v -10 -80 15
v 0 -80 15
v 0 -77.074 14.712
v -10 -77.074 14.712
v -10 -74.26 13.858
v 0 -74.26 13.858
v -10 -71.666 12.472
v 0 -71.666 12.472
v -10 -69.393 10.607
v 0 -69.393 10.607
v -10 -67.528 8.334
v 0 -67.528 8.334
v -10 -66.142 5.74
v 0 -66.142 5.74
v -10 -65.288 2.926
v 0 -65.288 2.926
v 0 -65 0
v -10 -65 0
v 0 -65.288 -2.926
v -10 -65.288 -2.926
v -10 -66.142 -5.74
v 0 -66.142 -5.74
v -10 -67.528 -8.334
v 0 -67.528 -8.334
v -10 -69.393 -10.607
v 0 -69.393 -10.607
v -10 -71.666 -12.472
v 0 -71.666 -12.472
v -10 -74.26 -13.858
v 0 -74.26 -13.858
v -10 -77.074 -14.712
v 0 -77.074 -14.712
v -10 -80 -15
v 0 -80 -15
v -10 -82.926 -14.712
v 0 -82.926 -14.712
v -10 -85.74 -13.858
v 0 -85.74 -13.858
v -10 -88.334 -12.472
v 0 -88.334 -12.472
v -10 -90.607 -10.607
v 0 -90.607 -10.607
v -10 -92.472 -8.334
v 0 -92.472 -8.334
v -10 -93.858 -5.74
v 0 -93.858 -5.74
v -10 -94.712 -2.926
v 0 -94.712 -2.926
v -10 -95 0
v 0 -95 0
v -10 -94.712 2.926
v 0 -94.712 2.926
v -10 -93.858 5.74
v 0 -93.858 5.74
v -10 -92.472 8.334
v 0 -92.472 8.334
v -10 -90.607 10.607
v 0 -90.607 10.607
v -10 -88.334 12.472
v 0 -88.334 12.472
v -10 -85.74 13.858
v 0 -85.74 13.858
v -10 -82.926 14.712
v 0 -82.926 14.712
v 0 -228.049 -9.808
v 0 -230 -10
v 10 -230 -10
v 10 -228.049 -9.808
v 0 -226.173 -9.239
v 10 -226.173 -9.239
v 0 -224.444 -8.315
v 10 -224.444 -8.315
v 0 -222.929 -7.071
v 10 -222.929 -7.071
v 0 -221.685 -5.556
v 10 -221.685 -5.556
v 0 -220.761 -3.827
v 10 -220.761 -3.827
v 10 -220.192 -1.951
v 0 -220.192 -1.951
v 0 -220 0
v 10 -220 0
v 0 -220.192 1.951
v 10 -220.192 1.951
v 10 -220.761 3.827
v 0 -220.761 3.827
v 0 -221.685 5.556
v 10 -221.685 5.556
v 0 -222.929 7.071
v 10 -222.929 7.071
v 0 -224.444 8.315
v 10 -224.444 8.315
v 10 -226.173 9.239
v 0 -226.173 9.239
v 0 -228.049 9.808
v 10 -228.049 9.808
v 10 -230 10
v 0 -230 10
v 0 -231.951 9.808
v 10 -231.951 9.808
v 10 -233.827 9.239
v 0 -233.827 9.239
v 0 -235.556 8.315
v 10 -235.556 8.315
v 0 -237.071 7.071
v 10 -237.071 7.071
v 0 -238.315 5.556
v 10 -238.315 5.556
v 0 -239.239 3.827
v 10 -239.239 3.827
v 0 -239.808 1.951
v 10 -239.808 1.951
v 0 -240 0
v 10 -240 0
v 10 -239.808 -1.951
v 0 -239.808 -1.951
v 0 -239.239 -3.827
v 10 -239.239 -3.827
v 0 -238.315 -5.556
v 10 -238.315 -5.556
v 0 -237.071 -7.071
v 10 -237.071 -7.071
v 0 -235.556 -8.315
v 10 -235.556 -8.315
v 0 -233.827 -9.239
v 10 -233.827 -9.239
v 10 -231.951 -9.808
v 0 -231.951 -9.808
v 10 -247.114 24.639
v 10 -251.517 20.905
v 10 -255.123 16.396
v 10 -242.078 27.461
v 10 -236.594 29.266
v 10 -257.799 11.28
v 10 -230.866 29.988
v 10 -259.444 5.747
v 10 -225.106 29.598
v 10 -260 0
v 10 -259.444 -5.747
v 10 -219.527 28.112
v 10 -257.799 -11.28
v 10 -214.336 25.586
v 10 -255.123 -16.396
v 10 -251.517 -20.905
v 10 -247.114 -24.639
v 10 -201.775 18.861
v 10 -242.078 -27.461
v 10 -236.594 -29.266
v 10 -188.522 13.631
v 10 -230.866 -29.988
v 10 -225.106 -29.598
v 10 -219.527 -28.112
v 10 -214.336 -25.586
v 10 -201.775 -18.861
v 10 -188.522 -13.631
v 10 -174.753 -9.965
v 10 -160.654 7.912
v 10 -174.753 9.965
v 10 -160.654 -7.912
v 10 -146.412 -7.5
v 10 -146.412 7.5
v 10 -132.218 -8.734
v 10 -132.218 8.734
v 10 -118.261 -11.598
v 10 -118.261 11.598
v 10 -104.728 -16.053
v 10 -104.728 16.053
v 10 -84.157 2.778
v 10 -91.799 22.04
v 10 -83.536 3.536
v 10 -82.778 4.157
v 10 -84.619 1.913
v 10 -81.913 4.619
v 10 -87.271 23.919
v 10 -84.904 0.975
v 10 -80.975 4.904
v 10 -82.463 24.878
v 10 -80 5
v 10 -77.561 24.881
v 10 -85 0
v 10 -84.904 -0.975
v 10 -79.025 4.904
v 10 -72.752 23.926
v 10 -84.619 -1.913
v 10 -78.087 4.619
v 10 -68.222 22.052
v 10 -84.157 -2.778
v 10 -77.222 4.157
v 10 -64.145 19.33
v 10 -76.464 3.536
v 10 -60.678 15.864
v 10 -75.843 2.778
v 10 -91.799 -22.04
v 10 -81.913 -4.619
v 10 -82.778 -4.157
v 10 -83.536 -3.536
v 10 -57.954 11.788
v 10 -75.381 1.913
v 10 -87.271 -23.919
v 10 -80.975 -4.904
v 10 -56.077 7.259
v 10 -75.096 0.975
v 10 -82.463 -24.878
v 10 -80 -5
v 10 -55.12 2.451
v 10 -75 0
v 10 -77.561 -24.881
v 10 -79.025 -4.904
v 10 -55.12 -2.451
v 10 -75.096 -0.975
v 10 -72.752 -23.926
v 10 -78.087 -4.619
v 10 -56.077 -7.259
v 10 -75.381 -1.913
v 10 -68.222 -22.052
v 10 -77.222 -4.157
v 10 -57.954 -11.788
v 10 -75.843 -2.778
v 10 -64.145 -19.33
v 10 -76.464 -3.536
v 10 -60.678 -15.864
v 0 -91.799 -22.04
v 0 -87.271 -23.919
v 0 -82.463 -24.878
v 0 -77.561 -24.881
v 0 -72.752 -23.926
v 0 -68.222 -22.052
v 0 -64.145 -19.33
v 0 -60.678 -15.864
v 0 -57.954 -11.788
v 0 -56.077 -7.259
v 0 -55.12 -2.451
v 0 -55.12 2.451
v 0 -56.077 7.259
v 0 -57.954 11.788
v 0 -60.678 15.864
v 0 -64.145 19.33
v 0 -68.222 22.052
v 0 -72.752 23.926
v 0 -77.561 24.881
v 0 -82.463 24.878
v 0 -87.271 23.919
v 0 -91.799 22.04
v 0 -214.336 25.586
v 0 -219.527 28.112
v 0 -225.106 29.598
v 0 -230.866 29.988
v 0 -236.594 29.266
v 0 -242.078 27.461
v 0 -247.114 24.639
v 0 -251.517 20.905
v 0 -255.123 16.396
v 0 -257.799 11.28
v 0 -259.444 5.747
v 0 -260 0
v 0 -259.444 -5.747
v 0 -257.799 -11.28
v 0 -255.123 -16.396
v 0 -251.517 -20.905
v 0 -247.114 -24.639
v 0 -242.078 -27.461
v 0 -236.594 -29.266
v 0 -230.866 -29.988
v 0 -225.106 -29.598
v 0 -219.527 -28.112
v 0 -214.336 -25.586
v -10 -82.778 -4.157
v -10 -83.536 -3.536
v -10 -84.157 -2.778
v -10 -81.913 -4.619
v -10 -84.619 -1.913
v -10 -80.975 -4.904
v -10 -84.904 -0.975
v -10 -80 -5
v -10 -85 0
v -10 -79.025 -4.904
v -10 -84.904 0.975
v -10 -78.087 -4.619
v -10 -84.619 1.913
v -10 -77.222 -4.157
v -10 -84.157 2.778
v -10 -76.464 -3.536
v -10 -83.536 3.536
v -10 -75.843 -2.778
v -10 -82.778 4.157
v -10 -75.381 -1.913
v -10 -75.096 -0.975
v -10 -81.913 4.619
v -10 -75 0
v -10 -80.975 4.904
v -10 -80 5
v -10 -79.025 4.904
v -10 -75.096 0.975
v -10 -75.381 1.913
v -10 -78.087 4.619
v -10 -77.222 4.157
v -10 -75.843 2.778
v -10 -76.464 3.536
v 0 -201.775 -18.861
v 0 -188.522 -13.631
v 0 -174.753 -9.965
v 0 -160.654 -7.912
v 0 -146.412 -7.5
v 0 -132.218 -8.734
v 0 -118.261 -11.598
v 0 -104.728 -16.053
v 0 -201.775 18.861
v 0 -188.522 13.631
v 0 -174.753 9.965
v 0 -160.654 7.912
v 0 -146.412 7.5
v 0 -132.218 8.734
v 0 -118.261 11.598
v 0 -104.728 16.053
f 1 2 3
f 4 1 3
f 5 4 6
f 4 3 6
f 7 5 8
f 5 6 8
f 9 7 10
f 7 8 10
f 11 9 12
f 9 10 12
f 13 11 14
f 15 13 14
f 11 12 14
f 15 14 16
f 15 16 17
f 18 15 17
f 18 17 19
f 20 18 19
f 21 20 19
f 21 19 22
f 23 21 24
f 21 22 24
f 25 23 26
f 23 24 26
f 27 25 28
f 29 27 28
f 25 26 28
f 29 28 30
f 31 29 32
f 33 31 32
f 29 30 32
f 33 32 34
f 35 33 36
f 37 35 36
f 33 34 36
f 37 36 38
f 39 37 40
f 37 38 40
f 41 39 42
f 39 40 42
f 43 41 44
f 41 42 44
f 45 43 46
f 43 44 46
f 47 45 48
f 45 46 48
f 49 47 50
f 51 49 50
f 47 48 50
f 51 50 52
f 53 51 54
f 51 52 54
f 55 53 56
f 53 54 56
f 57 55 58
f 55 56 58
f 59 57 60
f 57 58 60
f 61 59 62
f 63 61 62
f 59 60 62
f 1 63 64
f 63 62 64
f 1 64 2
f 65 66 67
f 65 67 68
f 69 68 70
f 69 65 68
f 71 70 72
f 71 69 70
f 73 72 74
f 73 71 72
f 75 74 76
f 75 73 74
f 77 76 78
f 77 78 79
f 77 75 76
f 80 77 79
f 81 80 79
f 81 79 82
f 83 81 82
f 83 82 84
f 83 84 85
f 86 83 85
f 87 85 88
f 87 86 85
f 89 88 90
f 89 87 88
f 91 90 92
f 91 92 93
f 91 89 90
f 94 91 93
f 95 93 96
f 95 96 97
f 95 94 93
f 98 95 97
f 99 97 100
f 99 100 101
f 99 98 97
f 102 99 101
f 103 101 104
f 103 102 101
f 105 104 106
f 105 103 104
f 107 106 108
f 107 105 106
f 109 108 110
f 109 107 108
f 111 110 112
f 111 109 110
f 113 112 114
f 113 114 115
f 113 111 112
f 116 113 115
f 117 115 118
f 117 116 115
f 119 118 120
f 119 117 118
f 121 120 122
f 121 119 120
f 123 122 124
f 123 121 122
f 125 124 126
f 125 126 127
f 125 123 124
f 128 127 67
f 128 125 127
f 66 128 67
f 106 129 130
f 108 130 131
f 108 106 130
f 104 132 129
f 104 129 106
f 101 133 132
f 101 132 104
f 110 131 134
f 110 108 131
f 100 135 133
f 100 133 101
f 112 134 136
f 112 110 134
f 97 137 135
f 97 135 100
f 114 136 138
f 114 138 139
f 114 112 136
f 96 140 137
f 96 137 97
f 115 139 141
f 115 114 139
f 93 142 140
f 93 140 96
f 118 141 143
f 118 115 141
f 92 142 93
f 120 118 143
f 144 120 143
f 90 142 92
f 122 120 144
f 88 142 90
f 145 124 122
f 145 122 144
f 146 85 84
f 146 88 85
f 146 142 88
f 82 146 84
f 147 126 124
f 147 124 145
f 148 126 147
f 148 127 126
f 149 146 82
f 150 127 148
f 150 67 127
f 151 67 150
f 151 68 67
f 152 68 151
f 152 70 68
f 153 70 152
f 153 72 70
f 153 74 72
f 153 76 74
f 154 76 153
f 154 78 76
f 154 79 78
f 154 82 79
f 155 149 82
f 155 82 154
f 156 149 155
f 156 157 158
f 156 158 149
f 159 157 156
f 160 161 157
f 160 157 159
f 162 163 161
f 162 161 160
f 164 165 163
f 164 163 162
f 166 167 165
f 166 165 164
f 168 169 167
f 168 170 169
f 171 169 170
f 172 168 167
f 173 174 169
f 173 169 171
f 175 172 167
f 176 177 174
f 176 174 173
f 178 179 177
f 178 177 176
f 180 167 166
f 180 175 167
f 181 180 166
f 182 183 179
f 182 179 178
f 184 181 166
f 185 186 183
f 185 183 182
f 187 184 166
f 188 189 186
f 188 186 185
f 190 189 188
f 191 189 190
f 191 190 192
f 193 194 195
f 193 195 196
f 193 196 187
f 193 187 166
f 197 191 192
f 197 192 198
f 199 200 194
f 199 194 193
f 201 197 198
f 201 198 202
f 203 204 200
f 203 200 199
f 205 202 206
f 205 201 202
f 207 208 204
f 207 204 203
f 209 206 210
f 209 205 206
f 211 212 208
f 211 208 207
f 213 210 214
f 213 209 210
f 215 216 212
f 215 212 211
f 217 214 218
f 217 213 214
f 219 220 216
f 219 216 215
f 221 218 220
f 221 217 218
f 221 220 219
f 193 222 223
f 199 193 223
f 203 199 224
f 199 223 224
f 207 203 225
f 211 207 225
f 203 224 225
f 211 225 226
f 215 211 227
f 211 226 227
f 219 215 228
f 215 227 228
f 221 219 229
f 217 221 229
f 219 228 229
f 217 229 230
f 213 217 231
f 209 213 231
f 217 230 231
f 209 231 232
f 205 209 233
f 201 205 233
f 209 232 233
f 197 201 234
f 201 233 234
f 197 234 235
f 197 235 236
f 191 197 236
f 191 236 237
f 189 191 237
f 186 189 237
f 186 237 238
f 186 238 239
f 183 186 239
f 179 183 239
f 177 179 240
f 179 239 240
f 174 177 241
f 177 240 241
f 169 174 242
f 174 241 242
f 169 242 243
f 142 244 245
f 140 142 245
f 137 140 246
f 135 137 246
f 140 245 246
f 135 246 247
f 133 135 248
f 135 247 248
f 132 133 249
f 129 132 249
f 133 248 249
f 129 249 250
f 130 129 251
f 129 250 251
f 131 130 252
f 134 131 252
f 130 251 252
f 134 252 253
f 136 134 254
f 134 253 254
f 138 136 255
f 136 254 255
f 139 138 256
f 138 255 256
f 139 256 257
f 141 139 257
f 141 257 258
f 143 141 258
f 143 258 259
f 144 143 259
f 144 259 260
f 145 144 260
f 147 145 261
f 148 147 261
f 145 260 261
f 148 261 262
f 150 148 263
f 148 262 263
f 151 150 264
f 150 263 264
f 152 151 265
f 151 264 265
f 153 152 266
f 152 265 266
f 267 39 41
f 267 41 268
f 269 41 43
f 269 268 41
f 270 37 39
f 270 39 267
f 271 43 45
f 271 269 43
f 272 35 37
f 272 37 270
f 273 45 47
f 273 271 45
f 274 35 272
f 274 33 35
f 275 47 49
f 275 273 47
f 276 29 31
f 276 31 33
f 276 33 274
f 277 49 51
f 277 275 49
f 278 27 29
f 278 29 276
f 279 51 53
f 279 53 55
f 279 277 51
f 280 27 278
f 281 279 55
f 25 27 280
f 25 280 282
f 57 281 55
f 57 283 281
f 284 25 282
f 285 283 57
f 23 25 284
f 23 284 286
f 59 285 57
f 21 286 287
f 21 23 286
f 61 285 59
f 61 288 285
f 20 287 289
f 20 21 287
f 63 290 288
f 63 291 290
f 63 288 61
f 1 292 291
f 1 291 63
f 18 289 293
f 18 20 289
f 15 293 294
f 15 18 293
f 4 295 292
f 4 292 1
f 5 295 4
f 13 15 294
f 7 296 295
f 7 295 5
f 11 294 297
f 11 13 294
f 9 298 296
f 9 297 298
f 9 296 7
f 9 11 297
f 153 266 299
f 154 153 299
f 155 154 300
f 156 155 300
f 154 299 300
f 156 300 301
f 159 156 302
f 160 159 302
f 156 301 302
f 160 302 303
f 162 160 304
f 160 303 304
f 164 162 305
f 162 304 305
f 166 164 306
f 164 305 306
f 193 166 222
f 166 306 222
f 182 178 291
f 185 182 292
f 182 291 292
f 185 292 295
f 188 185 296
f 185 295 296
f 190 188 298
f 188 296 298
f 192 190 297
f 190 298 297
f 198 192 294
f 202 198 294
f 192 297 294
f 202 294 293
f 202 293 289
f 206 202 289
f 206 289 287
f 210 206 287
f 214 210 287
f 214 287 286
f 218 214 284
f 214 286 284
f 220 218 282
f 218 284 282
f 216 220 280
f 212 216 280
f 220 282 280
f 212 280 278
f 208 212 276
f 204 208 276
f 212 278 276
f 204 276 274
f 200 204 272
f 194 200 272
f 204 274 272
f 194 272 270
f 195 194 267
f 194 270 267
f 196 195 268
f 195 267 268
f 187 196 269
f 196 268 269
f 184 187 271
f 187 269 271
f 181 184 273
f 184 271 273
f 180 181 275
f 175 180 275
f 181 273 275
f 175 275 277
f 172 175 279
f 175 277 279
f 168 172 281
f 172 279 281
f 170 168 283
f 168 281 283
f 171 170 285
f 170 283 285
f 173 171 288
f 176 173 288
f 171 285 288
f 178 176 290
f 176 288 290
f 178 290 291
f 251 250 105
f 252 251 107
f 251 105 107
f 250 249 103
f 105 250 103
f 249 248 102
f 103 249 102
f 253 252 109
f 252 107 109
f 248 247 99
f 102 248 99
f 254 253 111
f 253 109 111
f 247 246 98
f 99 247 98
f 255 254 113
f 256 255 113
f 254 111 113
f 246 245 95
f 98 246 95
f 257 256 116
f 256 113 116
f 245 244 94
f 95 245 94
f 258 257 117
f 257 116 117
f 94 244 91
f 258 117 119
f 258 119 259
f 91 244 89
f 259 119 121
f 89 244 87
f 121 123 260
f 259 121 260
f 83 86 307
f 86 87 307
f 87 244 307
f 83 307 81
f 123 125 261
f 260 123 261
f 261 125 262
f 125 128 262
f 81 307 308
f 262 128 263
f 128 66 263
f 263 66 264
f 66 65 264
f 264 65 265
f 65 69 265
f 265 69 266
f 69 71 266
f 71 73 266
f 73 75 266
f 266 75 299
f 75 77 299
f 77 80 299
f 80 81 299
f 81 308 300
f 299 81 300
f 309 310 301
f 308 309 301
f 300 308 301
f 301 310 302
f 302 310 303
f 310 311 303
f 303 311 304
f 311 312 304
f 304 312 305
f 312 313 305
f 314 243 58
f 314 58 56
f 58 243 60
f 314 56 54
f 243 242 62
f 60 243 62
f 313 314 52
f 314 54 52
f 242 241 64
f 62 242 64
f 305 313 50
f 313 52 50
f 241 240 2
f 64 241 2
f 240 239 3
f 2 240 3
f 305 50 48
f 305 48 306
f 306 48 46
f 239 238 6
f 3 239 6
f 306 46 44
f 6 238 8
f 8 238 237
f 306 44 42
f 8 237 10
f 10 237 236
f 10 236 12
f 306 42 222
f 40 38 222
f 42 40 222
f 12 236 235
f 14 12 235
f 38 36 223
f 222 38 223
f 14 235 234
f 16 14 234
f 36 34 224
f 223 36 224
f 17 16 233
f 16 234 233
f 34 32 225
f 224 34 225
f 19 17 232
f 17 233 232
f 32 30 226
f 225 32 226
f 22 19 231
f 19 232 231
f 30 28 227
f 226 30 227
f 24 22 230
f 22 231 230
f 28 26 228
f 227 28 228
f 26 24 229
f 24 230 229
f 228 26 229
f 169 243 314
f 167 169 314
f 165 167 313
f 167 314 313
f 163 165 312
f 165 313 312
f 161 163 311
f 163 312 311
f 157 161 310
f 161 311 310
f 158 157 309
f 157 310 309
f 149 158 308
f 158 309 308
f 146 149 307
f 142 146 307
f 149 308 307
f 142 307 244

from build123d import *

# Parameters (mm, degrees)
SKETCH1_R           = 10
BOSS_EXTRUDE1_DEPTH = 10
SKETCH3_R           = 15
BOSS_EXTRUDE3_DEPTH = 10
SKETCH4_R           = 5
CUT_EXTRUDE1_DEPTH  = 20


with BuildPart() as part:
    # Sketch1 → Boss-Extrude1 (new body)
    with BuildSketch(Plane(origin=(0, 0, 0), x_dir=(0, 0, -1), z_dir=(1, 0, 0))):
        with BuildLine():
            ThreePointArc((22.040471077, -91.799052281), (0, -55), (-22.040471077, -91.799052281))
            ThreePointArc((-22.040471077, -91.799052281), (-7.5, -153.539335996), (-25.58571686, -214.33567452))
            ThreePointArc((-25.58571686, -214.33567452), (0, -260), (25.58571686, -214.33567452))
            ThreePointArc((25.58571686, -214.33567452), (7.5, -153.539335996), (22.040471077, -91.799052281))
        make_face()
        with Locations((0, -230)):
            Circle(SKETCH1_R, mode=Mode.SUBTRACT)
    extrude(amount=BOSS_EXTRUDE1_DEPTH)

    # Sketch3 → Boss-Extrude3 (add)
    with BuildSketch(Plane.ZY):
        with Locations((0, -80)):
            Circle(SKETCH3_R)
    extrude(amount=BOSS_EXTRUDE3_DEPTH)

    # Sketch4 → Cut-Extrude1 (cut)
    with BuildSketch(Plane.ZY.offset(10)):
        with Locations((0, -80)):
            Circle(SKETCH4_R)
    extrude(amount=-CUT_EXTRUDE1_DEPTH, mode=Mode.SUBTRACT)


solid = part.part
